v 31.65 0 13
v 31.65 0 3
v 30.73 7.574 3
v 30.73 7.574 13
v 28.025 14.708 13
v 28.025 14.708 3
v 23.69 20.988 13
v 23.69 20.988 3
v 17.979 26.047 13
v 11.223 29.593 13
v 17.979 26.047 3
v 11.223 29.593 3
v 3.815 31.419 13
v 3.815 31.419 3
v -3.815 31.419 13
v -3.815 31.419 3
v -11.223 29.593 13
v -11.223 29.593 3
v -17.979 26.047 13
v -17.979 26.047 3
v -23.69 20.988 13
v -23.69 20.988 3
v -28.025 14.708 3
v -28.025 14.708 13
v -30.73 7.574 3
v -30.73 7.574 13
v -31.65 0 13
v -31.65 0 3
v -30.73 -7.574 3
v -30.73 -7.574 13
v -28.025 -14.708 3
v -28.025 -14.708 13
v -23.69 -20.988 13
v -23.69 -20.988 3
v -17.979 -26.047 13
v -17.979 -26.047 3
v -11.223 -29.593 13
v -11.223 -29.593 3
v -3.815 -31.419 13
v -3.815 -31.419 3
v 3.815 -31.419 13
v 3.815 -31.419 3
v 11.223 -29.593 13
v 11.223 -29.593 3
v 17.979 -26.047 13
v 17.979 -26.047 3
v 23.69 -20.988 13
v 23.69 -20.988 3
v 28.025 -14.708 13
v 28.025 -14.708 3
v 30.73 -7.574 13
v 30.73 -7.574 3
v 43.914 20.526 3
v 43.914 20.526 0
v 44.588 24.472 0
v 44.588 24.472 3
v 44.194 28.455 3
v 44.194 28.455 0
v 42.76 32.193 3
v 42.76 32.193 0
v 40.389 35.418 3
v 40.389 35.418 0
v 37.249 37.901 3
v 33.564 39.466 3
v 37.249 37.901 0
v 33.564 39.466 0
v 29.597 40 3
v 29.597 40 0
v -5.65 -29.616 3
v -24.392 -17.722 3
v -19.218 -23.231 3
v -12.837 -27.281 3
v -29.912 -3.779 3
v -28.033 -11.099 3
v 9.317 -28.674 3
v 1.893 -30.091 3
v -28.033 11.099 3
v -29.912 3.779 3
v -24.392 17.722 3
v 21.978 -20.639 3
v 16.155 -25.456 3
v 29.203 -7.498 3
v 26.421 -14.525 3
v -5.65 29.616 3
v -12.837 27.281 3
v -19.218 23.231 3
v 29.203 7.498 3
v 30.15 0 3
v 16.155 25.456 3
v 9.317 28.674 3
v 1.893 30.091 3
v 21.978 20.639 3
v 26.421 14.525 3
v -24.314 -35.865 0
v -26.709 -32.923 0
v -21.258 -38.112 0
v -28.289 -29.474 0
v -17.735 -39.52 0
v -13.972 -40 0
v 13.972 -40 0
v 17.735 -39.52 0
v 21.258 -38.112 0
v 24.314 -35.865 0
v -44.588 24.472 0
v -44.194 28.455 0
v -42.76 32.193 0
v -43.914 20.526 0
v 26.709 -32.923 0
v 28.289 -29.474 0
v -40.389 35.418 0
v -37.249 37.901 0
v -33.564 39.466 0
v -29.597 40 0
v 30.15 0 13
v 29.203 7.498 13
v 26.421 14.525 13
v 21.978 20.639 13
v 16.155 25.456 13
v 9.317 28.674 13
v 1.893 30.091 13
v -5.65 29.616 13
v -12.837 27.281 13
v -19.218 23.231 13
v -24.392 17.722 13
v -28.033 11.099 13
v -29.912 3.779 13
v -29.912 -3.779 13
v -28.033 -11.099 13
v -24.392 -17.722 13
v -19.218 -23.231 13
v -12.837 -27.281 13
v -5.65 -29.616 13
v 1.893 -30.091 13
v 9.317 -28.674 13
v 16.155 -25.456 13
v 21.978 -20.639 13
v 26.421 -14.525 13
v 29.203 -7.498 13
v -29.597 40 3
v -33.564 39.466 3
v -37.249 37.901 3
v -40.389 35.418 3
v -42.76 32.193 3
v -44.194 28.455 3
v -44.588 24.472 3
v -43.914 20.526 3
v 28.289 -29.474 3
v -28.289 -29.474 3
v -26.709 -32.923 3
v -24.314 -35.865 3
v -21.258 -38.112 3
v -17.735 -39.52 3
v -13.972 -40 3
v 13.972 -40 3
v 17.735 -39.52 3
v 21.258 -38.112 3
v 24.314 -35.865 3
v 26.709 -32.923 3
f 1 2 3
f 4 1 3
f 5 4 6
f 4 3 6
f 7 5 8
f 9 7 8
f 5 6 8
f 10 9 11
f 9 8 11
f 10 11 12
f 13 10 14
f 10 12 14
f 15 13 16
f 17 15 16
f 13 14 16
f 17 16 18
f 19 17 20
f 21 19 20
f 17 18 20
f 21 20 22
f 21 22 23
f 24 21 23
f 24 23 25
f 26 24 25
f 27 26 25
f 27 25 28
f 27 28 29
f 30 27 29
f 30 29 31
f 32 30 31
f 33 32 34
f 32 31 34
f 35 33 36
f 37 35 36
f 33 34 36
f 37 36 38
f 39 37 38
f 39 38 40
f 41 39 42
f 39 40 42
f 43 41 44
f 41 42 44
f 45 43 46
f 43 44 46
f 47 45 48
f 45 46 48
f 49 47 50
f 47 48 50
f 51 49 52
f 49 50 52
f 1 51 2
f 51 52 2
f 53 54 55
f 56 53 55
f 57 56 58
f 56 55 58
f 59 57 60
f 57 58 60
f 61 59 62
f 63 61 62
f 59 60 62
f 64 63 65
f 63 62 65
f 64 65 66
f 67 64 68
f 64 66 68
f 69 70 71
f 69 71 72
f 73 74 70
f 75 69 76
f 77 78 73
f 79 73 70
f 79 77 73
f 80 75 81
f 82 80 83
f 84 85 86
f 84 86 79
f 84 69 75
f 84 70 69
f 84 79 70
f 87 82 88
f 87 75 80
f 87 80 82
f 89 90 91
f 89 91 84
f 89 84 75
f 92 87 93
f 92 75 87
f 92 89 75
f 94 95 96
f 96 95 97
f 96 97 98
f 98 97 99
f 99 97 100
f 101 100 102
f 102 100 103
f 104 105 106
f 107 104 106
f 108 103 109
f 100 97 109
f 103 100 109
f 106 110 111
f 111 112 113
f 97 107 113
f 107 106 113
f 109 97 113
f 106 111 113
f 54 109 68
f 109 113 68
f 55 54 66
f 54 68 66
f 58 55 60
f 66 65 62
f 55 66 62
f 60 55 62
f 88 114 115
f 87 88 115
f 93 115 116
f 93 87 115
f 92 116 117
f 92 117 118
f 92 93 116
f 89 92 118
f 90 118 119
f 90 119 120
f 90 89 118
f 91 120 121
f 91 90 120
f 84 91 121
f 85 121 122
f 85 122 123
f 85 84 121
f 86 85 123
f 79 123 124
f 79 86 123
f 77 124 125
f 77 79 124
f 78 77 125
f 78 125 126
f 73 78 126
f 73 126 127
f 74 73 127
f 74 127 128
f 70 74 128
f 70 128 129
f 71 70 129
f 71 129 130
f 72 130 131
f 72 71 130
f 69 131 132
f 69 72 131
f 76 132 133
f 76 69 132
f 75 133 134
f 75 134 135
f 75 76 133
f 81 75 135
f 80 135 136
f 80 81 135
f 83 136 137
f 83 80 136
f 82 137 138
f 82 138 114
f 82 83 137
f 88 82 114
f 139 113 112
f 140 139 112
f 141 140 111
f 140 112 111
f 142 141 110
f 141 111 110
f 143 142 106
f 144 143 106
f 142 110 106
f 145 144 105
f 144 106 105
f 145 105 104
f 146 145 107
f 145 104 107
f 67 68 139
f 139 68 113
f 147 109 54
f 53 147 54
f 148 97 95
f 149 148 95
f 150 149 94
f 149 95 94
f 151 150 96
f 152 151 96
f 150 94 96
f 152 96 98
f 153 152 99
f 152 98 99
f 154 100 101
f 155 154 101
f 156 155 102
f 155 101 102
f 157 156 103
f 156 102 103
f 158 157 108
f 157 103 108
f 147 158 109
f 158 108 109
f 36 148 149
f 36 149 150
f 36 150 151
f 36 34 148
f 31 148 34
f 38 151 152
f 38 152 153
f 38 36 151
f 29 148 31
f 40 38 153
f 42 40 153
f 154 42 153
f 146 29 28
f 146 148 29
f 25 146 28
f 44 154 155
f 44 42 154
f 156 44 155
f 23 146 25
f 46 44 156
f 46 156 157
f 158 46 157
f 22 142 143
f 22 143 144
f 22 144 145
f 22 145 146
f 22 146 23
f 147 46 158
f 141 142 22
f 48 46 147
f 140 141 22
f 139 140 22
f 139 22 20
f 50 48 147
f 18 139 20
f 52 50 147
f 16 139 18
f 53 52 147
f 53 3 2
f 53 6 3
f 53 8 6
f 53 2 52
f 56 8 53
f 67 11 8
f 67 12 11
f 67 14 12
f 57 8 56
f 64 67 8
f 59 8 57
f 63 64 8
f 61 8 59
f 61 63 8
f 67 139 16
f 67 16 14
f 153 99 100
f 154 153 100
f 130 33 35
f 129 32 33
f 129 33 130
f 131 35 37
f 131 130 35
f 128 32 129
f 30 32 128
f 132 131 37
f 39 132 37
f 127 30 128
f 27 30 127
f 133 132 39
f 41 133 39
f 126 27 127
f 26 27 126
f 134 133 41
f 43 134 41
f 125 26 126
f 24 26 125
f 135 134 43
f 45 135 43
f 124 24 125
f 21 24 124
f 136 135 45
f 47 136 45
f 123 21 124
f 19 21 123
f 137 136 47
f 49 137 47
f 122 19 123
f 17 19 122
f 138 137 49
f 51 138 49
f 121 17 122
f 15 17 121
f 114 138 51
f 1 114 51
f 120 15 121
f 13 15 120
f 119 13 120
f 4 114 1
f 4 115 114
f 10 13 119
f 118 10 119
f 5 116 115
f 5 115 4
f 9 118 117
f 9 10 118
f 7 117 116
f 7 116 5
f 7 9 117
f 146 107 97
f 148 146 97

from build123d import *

# Parameters (mm, degrees)
PAD_DEPTH     = 3
SKETCH001_R   = 31.65
SKETCH001_R_2 = 30.15
PAD001_DEPTH  = 10


with BuildPart() as part:
    # Sketch → Pad (new body)
    with BuildSketch(Plane.XY):
        with BuildLine():
            Line((29.597136, 40), (-29.597136, 40))
            ThreePointArc((-29.597136, 40), (-41.682497, 33.885047), (-43.914336, 20.525875))
            Line((-43.914336, 20.525875), (-28.289336, -29.474125))
            ThreePointArc((-28.289336, -29.474125), (-22.857183, -37.08536), (-13.972136, -40))
            Line((-13.972136, -40), (13.972136, -40))
            ThreePointArc((13.972136, -40), (22.857183, -37.08536), (28.289336, -29.474125))
            Line((28.289336, -29.474125), (43.914336, 20.525875))
            ThreePointArc((43.914336, 20.525875), (41.682497, 33.885047), (29.597136, 40))
        make_face()
    extrude(amount=PAD_DEPTH)

    # Sketch001 (on Face10 of Pad) → Pad001 (join)
    with BuildSketch(Plane.XY.offset(3)):
        Circle(SKETCH001_R)
        Circle(SKETCH001_R_2, mode=Mode.SUBTRACT)
    extrude(amount=PAD001_DEPTH)


solid = part.part
